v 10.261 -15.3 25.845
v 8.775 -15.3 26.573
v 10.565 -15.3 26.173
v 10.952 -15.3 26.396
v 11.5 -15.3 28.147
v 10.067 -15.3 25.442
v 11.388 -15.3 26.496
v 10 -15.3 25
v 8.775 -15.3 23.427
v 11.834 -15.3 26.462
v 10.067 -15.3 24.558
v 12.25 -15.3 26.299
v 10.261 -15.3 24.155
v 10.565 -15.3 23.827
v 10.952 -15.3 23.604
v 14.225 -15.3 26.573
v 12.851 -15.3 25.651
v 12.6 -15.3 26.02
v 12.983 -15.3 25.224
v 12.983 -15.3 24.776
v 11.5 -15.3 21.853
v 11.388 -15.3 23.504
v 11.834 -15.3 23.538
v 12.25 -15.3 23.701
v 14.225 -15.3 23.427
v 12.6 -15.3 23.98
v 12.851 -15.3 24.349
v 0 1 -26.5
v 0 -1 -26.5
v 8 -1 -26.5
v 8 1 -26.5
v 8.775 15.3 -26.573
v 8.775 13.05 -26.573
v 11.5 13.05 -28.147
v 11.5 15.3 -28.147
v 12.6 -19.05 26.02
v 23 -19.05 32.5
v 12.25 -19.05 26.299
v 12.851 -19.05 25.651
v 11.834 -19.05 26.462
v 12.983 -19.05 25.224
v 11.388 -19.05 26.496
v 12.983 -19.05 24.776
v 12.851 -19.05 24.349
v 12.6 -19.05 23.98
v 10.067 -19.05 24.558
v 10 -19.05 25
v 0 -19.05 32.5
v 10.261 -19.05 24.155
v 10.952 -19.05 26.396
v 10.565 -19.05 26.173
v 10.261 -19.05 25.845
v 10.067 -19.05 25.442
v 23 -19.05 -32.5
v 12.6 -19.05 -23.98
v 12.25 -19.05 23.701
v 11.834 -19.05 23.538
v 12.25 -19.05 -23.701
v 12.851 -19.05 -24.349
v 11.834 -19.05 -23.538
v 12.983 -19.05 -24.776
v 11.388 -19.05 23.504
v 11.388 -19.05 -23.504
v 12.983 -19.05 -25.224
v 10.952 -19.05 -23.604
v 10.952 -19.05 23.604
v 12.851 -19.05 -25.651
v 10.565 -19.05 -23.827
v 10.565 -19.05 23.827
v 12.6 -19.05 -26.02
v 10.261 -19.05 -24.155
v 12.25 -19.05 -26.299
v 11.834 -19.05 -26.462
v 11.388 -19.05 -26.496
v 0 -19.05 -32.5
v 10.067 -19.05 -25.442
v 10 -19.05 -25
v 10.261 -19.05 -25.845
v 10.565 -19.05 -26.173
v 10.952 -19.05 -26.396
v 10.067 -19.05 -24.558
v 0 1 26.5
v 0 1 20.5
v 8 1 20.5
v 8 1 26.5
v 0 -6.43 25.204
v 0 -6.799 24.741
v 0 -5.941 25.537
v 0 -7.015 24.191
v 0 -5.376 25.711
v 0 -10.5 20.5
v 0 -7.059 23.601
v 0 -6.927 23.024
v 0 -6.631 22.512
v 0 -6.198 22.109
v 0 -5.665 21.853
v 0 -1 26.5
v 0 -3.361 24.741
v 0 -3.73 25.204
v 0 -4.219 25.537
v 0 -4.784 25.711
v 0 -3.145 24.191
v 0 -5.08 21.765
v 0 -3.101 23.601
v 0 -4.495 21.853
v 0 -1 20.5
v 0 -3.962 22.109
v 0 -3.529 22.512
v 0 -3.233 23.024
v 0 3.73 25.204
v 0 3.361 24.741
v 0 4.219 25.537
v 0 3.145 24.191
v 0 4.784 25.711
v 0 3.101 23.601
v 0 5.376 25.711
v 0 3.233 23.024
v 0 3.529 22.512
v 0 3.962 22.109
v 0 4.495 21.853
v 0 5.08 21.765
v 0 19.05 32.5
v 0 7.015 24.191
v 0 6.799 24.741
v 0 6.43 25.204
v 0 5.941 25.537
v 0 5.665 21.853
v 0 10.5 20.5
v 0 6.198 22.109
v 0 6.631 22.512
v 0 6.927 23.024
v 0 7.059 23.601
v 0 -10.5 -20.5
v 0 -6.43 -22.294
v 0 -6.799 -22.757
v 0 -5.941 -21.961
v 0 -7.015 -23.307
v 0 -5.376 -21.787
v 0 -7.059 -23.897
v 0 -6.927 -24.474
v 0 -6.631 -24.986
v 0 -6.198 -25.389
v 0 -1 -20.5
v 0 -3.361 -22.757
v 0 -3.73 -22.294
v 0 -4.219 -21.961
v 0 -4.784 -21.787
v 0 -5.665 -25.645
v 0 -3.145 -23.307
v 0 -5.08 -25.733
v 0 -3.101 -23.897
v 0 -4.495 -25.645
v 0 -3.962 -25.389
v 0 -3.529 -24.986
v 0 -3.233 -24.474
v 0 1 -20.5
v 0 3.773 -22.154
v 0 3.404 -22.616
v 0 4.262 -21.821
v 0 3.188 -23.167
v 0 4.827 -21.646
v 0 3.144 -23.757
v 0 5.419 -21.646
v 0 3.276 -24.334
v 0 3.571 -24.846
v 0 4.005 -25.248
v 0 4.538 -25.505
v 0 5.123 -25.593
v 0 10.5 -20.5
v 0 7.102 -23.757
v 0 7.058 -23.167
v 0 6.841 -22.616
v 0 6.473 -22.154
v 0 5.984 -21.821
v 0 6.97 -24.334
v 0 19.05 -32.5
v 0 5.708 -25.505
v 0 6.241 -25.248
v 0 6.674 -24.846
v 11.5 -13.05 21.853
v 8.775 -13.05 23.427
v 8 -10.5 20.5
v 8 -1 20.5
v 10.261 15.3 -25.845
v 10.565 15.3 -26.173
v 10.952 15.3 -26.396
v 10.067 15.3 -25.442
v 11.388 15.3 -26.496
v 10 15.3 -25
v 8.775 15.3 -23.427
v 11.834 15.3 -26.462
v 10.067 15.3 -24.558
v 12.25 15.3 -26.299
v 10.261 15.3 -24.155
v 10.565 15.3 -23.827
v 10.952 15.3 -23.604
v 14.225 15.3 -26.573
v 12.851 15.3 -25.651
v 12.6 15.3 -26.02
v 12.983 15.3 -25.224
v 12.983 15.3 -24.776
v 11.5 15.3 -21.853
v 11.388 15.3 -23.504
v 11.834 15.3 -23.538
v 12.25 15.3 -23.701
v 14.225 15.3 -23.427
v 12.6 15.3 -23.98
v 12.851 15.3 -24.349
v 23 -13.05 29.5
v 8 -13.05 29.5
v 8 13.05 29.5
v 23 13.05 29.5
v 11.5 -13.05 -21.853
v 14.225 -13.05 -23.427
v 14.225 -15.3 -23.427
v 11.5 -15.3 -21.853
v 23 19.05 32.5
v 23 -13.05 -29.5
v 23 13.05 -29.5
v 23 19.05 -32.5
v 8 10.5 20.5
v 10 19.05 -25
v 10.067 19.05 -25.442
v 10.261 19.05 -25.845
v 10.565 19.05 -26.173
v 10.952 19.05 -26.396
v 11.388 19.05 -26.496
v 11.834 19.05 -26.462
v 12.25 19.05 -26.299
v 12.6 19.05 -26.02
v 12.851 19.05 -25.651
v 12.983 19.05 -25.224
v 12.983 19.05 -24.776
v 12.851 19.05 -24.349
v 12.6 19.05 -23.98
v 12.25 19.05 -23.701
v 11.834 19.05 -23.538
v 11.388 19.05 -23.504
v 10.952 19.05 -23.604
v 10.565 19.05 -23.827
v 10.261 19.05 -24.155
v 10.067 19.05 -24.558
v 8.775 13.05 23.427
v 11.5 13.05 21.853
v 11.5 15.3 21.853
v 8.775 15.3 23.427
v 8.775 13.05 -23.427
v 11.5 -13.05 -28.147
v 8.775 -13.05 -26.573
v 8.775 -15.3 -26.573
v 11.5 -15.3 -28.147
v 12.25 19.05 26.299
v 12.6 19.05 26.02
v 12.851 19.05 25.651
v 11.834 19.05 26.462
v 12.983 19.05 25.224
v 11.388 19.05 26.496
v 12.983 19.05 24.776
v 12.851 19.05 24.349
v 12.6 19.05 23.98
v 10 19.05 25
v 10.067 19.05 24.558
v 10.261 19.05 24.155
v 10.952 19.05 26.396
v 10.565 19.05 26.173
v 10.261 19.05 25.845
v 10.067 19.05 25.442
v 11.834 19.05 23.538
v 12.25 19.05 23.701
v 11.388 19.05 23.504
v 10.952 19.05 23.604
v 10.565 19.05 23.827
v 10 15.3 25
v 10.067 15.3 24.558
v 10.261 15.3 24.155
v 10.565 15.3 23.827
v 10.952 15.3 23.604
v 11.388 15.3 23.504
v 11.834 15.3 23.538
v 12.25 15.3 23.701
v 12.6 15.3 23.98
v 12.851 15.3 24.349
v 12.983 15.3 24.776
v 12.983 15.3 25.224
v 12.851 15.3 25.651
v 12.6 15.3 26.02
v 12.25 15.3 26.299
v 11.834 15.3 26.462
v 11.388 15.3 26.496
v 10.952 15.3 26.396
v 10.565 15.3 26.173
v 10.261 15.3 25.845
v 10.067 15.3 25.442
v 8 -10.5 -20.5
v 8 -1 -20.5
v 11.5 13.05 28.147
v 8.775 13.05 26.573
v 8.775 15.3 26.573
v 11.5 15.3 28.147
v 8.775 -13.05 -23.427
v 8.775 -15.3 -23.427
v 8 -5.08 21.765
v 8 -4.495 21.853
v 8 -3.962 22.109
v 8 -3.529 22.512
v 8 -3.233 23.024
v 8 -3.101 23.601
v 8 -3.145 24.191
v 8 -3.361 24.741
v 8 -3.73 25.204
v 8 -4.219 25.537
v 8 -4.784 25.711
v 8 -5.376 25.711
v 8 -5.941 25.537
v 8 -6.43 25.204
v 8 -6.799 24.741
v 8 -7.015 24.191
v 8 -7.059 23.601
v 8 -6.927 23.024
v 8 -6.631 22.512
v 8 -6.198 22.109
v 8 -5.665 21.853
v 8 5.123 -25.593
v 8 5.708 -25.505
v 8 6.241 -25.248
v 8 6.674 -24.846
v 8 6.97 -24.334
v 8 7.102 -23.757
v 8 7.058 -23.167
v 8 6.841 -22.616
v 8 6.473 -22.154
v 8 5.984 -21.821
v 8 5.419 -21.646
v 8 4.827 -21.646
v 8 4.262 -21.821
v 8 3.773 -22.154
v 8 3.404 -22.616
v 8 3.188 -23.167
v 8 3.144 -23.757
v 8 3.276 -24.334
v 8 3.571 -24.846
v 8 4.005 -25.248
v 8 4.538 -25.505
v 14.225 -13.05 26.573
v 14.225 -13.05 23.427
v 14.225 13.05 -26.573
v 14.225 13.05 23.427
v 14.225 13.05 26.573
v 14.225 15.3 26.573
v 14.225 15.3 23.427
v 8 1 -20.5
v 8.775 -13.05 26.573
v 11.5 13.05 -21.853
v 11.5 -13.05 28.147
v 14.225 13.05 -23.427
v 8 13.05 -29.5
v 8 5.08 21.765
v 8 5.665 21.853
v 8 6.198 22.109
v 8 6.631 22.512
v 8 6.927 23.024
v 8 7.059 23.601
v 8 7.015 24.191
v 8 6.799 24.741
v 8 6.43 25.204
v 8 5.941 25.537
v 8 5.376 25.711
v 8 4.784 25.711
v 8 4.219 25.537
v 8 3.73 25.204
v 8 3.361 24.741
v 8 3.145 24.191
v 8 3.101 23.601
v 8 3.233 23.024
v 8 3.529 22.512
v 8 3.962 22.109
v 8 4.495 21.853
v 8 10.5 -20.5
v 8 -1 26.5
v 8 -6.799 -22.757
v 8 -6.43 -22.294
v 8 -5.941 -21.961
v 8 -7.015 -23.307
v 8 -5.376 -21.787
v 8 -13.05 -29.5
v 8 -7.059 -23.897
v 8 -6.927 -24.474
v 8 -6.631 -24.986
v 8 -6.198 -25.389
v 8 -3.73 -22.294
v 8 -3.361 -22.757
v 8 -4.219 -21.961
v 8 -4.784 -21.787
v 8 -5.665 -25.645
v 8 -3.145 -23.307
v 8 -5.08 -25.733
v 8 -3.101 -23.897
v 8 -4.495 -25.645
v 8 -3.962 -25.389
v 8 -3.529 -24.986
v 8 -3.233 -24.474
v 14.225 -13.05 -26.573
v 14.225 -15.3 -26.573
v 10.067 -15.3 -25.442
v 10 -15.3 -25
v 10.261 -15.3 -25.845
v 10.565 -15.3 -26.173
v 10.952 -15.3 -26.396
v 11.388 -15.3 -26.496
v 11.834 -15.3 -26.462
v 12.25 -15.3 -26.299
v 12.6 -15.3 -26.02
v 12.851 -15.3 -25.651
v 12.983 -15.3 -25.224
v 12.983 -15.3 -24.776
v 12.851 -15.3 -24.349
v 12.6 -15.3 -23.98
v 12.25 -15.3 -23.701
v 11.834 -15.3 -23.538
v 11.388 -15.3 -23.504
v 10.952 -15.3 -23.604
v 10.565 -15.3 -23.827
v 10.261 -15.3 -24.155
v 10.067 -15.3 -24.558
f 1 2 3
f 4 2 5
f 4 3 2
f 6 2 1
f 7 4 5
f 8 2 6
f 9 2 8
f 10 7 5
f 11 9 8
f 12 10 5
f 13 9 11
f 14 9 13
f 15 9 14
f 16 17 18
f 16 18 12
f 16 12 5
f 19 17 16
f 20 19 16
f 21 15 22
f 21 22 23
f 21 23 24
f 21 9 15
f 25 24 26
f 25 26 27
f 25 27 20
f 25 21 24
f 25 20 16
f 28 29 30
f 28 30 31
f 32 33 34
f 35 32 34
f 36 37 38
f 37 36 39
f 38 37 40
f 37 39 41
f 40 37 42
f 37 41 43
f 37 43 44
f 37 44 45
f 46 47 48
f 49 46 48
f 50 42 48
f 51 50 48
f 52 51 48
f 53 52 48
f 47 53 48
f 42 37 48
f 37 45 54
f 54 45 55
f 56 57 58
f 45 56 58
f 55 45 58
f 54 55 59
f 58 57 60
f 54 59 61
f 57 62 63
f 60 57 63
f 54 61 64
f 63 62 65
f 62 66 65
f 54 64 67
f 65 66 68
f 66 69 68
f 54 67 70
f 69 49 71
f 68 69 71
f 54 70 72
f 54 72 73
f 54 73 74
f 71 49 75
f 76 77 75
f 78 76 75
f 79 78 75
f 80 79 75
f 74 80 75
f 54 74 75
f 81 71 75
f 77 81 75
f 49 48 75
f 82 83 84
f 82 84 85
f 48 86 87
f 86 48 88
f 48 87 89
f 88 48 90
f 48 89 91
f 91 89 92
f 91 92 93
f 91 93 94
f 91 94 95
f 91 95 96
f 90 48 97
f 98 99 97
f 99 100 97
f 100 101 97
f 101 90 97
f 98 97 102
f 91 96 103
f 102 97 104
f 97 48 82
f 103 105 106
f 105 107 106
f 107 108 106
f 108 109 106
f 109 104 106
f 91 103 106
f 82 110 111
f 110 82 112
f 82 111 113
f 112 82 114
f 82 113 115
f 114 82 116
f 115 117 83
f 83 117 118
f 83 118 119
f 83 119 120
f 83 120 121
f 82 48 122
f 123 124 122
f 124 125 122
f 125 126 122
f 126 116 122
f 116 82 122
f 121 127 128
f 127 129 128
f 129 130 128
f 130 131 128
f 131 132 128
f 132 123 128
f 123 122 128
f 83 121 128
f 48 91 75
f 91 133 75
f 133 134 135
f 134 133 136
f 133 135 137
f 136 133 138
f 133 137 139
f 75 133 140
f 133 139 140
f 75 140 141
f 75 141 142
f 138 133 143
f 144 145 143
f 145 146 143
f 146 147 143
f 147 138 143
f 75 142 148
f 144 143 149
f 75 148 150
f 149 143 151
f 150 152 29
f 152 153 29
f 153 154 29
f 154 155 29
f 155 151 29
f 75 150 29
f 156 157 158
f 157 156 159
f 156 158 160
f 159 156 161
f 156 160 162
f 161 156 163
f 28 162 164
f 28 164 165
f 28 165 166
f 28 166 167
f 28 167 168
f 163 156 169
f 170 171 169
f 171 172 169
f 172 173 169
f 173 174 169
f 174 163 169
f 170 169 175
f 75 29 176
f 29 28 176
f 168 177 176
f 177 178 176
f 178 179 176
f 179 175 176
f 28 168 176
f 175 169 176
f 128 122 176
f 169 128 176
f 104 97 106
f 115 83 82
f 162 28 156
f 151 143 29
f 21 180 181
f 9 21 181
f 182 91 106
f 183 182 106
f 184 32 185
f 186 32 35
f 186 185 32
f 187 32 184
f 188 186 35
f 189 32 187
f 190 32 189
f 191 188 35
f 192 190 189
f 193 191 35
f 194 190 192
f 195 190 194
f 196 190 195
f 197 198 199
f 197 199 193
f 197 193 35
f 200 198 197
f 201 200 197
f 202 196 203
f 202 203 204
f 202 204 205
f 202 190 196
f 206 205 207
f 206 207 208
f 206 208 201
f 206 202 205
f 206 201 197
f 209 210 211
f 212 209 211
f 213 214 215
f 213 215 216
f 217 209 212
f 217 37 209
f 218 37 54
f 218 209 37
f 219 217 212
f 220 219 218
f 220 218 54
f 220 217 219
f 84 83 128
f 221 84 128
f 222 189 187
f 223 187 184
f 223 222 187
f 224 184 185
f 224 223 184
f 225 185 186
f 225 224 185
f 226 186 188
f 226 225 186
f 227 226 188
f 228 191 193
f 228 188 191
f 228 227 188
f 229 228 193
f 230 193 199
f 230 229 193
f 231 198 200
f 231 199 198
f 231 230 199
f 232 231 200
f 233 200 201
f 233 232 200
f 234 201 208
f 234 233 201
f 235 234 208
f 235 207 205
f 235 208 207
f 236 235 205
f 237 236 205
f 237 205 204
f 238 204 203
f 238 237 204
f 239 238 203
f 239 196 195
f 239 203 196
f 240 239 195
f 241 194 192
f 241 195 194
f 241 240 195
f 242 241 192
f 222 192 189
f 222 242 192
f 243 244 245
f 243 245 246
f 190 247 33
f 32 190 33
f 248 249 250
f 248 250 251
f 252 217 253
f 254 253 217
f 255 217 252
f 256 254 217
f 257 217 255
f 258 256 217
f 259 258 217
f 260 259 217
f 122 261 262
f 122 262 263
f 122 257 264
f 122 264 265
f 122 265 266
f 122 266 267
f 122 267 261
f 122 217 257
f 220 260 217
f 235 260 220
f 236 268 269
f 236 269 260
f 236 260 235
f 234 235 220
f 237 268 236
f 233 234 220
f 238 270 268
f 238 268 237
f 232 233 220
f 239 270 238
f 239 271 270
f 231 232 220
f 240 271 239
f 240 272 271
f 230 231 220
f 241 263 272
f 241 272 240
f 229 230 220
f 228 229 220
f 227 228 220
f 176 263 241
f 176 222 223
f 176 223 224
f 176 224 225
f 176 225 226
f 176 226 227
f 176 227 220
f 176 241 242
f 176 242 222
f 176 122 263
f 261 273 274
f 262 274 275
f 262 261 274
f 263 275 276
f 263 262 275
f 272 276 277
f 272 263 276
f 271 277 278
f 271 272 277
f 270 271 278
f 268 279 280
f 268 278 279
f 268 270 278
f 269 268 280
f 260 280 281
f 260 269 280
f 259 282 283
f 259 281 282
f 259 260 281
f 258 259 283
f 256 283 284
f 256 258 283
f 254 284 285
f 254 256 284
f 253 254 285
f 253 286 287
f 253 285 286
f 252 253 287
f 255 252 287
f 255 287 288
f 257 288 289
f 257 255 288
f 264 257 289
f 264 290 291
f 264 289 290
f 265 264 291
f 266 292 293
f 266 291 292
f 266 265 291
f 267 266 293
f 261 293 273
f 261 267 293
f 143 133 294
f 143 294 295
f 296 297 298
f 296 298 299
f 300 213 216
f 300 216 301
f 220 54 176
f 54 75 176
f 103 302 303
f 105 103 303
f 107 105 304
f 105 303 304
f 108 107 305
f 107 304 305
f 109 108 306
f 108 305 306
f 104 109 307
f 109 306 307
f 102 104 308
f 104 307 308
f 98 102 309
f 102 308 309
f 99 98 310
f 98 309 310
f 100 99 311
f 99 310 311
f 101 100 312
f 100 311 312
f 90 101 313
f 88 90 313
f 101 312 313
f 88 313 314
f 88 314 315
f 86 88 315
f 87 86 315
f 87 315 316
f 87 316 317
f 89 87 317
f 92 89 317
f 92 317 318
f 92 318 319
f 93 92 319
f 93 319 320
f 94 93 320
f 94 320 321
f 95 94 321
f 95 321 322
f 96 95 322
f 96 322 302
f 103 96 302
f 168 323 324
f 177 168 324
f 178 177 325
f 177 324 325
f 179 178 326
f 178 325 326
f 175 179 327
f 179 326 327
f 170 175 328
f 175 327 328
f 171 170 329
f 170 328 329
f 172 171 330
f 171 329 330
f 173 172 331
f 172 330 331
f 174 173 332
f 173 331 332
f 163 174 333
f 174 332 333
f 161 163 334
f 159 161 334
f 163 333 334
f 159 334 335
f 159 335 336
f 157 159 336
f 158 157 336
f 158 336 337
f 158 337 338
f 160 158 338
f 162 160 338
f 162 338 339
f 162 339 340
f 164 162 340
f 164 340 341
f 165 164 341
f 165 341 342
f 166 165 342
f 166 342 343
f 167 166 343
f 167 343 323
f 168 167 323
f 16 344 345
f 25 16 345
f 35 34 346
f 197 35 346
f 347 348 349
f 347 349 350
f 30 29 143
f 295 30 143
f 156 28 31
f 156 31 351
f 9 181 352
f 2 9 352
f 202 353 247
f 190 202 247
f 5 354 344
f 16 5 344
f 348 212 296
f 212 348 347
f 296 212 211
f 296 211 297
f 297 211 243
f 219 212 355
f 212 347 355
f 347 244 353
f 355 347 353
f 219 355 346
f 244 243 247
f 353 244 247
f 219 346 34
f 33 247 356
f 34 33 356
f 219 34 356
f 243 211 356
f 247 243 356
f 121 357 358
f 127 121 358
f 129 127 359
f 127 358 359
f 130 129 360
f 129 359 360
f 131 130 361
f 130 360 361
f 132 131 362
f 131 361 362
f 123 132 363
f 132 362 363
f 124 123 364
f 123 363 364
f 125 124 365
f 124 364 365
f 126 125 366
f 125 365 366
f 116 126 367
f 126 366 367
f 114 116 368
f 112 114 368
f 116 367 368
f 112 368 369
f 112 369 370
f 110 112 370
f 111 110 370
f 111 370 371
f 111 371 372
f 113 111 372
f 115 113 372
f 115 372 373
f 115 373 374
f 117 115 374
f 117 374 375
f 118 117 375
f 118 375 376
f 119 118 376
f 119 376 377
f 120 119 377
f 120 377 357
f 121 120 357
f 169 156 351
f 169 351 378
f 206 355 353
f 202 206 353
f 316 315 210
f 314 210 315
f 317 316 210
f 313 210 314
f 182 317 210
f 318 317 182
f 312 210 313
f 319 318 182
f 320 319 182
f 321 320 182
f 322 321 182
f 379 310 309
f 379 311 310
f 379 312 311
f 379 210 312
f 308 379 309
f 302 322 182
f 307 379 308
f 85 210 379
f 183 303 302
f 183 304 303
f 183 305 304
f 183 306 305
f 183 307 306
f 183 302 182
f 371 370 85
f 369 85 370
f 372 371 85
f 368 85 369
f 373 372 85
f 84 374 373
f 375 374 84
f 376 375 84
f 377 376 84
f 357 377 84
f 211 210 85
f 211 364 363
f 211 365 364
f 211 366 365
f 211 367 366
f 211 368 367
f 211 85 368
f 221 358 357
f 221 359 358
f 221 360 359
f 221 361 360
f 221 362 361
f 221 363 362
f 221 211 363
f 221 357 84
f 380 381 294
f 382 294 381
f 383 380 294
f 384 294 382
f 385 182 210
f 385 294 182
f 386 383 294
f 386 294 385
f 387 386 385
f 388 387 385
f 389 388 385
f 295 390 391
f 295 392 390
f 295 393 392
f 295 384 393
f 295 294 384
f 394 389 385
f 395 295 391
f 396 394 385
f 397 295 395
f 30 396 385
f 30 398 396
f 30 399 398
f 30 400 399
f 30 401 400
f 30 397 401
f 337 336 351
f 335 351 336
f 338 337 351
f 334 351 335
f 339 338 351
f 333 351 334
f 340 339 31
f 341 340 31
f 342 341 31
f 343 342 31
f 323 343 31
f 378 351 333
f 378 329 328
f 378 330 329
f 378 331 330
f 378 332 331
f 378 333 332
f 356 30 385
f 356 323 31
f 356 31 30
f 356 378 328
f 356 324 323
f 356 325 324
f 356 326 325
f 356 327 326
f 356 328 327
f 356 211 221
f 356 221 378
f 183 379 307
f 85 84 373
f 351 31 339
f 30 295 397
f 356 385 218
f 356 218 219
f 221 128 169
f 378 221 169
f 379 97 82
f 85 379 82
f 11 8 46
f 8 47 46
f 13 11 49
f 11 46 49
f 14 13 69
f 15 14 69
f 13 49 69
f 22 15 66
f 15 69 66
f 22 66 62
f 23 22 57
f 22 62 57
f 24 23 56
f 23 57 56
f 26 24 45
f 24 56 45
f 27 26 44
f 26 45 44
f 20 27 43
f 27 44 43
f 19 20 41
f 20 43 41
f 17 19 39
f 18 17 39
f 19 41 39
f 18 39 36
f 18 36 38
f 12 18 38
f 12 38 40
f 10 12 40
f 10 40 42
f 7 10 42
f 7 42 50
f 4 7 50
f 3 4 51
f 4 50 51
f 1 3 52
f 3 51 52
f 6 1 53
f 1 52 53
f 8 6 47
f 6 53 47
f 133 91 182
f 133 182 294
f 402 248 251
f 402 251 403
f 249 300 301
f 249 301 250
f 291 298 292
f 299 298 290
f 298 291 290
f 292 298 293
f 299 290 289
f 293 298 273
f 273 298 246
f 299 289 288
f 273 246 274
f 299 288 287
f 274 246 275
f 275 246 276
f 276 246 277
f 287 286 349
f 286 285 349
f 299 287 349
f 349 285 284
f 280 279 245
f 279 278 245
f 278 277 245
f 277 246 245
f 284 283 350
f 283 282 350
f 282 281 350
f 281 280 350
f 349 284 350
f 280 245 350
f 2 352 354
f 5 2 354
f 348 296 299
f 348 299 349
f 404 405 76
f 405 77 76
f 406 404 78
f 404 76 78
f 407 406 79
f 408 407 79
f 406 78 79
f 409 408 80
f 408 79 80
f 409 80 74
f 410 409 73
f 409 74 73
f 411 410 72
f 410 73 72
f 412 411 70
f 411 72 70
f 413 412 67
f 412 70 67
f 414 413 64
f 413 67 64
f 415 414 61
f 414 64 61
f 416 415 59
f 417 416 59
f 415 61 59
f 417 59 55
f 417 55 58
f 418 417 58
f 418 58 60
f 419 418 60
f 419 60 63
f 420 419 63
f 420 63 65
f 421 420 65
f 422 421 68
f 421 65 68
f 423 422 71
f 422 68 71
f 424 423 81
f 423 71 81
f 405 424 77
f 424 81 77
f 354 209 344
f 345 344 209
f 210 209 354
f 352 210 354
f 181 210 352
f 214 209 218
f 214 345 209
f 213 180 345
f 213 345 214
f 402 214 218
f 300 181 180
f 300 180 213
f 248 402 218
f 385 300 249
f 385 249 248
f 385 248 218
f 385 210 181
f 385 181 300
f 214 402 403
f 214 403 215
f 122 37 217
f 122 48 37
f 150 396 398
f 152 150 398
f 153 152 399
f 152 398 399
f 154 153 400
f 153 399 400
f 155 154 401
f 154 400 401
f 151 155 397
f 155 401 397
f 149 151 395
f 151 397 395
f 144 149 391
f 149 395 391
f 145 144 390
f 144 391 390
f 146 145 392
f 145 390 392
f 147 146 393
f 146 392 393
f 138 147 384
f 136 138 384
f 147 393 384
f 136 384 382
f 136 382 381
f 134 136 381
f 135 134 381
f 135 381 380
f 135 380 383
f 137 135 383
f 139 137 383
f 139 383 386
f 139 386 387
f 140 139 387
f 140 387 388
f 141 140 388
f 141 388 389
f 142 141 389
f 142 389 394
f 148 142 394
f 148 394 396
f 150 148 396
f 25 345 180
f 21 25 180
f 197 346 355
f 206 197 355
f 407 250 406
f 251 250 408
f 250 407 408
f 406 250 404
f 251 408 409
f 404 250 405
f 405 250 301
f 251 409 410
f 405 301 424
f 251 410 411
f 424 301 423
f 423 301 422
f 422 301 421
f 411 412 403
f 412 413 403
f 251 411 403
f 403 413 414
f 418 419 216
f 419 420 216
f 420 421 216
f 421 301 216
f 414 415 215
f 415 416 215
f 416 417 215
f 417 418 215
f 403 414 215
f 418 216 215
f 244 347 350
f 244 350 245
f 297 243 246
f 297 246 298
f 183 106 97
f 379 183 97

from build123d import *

# Parameters (mm, degrees)
SKETCH1_W                                = 65
SKETCH1_H                                = 38.1
SKETCH1_W_2                              = 41
SKETCH1_H_2                              = 21
BOSS_EXTRUDE1_DEPTH                      = 8
SKETCH2_W                                = 65
SKETCH2_H                                = 38.1
SKETCH2_W_2                              = 59
SKETCH2_H_2                              = 26.1
BOSS_EXTRUDE2_DEPTH                      = 15
F_5_32_0_15625_DIAMETER_HOLE1_D          = 3.96875
F_3_0MM_DOWEL_HOLE1_D                    = 3
F_3_0MM_DOWEL_HOLE1_DEPTH                = 6
CUT_EXTRUDE1_DEPTH                       = 2.25
MIRROR2_AT_THE_SECOND_PLANE_COPY_1_DEPTH = 2.25
SKETCH9_W                                = 6
SKETCH9_H                                = 2
CUT_EXTRUDE2_DEPTH                       = 8


with BuildPart() as part:
    # Sketch1 → Boss-Extrude1 (new body)
    with BuildSketch(Plane(origin=(0, 0, 0), x_dir=(0, 0, -1), z_dir=(1, 0, 0))):
        Rectangle(SKETCH1_W, SKETCH1_H)
        Rectangle(SKETCH1_W_2, SKETCH1_H_2, mode=Mode.SUBTRACT)
    extrude(amount=BOSS_EXTRUDE1_DEPTH)

    # Sketch2 → Boss-Extrude2 (add)
    with BuildSketch(Plane(origin=(8, 0, 0), x_dir=(0, 0, -1), z_dir=(1, 0, 0))):
        Rectangle(SKETCH2_W, SKETCH2_H)
        Rectangle(SKETCH2_W_2, SKETCH2_H_2, mode=Mode.SUBTRACT)
    extrude(amount=BOSS_EXTRUDE2_DEPTH)

    # 5/32 (0.15625) Diameter Hole1 (through all)
    with Locations(Plane.ZY):
        with Locations((-23.60854322, 5.122882485), (-23.749, -5.08), (23.749, -5.08), (23.749, 5.08)):
            Hole(F_5_32_0_15625_DIAMETER_HOLE1_D / 2)

    # Ø3.0mm Dowel Hole1
    with Locations(Plane(origin=(0, -13.05, 0), x_dir=(1, 0, 0), z_dir=(0, 1, 0))):
        with Locations((11.5, 25), (11.5, -25)):
            f_3_0mm_dowel_hole1 = Hole(F_3_0MM_DOWEL_HOLE1_D / 2, depth=F_3_0MM_DOWEL_HOLE1_DEPTH)

    # Mirror1: Ø3.0mm Dowel Hole1 across plane
    add(f_3_0mm_dowel_hole1.mirror(Plane.ZX), mode=Mode.SUBTRACT)

    # Sketch7 → Cut-Extrude1 (cut)
    with BuildSketch(Plane(origin=(0, -13.05, 0), x_dir=(1, 0, 0), z_dir=(0, 1, 0))):
        Polygon((8.775, -26.573279484), (11.5, -28.146558967), (14.225, -26.573279484), (14.225, -23.426720516), (11.5, -21.853441033), (8.775, -23.426720516), align=None)
    cut_extrude1 = extrude(amount=-CUT_EXTRUDE1_DEPTH, mode=Mode.SUBTRACT)

    # Mirror2: Cut-Extrude1 across plane
    add(cut_extrude1.mirror(Plane.ZX), mode=Mode.SUBTRACT)

    # Mirror2 at the second plane: Cut-Extrude1 across plane
    add(cut_extrude1.mirror(Plane.XY), mode=Mode.SUBTRACT)

    # Mirror2 at the second plane copy 1 sketc → Mirror2 at the second plane copy 1 (cut)
    with BuildSketch(Plane.XZ.offset(-13.05)):
        Polygon((8.775, -26.573279484), (11.5, -28.146558967), (14.225, -26.573279484), (14.225, -23.426720516), (11.5, -21.853441033), (8.775, -23.426720516), align=None)
    extrude(amount=-MIRROR2_AT_THE_SECOND_PLANE_COPY_1_DEPTH, mode=Mode.SUBTRACT)

    # Sketch9 → Cut-Extrude2 (cut)
    with BuildSketch(Plane.ZY):
        with Locations((-23.5, 0)):
            Rectangle(SKETCH9_W, SKETCH9_H)
        with Locations((23.5, 0)):
            Rectangle(SKETCH9_W, SKETCH9_H)
    extrude(amount=-CUT_EXTRUDE2_DEPTH, mode=Mode.SUBTRACT)


solid = part.part
